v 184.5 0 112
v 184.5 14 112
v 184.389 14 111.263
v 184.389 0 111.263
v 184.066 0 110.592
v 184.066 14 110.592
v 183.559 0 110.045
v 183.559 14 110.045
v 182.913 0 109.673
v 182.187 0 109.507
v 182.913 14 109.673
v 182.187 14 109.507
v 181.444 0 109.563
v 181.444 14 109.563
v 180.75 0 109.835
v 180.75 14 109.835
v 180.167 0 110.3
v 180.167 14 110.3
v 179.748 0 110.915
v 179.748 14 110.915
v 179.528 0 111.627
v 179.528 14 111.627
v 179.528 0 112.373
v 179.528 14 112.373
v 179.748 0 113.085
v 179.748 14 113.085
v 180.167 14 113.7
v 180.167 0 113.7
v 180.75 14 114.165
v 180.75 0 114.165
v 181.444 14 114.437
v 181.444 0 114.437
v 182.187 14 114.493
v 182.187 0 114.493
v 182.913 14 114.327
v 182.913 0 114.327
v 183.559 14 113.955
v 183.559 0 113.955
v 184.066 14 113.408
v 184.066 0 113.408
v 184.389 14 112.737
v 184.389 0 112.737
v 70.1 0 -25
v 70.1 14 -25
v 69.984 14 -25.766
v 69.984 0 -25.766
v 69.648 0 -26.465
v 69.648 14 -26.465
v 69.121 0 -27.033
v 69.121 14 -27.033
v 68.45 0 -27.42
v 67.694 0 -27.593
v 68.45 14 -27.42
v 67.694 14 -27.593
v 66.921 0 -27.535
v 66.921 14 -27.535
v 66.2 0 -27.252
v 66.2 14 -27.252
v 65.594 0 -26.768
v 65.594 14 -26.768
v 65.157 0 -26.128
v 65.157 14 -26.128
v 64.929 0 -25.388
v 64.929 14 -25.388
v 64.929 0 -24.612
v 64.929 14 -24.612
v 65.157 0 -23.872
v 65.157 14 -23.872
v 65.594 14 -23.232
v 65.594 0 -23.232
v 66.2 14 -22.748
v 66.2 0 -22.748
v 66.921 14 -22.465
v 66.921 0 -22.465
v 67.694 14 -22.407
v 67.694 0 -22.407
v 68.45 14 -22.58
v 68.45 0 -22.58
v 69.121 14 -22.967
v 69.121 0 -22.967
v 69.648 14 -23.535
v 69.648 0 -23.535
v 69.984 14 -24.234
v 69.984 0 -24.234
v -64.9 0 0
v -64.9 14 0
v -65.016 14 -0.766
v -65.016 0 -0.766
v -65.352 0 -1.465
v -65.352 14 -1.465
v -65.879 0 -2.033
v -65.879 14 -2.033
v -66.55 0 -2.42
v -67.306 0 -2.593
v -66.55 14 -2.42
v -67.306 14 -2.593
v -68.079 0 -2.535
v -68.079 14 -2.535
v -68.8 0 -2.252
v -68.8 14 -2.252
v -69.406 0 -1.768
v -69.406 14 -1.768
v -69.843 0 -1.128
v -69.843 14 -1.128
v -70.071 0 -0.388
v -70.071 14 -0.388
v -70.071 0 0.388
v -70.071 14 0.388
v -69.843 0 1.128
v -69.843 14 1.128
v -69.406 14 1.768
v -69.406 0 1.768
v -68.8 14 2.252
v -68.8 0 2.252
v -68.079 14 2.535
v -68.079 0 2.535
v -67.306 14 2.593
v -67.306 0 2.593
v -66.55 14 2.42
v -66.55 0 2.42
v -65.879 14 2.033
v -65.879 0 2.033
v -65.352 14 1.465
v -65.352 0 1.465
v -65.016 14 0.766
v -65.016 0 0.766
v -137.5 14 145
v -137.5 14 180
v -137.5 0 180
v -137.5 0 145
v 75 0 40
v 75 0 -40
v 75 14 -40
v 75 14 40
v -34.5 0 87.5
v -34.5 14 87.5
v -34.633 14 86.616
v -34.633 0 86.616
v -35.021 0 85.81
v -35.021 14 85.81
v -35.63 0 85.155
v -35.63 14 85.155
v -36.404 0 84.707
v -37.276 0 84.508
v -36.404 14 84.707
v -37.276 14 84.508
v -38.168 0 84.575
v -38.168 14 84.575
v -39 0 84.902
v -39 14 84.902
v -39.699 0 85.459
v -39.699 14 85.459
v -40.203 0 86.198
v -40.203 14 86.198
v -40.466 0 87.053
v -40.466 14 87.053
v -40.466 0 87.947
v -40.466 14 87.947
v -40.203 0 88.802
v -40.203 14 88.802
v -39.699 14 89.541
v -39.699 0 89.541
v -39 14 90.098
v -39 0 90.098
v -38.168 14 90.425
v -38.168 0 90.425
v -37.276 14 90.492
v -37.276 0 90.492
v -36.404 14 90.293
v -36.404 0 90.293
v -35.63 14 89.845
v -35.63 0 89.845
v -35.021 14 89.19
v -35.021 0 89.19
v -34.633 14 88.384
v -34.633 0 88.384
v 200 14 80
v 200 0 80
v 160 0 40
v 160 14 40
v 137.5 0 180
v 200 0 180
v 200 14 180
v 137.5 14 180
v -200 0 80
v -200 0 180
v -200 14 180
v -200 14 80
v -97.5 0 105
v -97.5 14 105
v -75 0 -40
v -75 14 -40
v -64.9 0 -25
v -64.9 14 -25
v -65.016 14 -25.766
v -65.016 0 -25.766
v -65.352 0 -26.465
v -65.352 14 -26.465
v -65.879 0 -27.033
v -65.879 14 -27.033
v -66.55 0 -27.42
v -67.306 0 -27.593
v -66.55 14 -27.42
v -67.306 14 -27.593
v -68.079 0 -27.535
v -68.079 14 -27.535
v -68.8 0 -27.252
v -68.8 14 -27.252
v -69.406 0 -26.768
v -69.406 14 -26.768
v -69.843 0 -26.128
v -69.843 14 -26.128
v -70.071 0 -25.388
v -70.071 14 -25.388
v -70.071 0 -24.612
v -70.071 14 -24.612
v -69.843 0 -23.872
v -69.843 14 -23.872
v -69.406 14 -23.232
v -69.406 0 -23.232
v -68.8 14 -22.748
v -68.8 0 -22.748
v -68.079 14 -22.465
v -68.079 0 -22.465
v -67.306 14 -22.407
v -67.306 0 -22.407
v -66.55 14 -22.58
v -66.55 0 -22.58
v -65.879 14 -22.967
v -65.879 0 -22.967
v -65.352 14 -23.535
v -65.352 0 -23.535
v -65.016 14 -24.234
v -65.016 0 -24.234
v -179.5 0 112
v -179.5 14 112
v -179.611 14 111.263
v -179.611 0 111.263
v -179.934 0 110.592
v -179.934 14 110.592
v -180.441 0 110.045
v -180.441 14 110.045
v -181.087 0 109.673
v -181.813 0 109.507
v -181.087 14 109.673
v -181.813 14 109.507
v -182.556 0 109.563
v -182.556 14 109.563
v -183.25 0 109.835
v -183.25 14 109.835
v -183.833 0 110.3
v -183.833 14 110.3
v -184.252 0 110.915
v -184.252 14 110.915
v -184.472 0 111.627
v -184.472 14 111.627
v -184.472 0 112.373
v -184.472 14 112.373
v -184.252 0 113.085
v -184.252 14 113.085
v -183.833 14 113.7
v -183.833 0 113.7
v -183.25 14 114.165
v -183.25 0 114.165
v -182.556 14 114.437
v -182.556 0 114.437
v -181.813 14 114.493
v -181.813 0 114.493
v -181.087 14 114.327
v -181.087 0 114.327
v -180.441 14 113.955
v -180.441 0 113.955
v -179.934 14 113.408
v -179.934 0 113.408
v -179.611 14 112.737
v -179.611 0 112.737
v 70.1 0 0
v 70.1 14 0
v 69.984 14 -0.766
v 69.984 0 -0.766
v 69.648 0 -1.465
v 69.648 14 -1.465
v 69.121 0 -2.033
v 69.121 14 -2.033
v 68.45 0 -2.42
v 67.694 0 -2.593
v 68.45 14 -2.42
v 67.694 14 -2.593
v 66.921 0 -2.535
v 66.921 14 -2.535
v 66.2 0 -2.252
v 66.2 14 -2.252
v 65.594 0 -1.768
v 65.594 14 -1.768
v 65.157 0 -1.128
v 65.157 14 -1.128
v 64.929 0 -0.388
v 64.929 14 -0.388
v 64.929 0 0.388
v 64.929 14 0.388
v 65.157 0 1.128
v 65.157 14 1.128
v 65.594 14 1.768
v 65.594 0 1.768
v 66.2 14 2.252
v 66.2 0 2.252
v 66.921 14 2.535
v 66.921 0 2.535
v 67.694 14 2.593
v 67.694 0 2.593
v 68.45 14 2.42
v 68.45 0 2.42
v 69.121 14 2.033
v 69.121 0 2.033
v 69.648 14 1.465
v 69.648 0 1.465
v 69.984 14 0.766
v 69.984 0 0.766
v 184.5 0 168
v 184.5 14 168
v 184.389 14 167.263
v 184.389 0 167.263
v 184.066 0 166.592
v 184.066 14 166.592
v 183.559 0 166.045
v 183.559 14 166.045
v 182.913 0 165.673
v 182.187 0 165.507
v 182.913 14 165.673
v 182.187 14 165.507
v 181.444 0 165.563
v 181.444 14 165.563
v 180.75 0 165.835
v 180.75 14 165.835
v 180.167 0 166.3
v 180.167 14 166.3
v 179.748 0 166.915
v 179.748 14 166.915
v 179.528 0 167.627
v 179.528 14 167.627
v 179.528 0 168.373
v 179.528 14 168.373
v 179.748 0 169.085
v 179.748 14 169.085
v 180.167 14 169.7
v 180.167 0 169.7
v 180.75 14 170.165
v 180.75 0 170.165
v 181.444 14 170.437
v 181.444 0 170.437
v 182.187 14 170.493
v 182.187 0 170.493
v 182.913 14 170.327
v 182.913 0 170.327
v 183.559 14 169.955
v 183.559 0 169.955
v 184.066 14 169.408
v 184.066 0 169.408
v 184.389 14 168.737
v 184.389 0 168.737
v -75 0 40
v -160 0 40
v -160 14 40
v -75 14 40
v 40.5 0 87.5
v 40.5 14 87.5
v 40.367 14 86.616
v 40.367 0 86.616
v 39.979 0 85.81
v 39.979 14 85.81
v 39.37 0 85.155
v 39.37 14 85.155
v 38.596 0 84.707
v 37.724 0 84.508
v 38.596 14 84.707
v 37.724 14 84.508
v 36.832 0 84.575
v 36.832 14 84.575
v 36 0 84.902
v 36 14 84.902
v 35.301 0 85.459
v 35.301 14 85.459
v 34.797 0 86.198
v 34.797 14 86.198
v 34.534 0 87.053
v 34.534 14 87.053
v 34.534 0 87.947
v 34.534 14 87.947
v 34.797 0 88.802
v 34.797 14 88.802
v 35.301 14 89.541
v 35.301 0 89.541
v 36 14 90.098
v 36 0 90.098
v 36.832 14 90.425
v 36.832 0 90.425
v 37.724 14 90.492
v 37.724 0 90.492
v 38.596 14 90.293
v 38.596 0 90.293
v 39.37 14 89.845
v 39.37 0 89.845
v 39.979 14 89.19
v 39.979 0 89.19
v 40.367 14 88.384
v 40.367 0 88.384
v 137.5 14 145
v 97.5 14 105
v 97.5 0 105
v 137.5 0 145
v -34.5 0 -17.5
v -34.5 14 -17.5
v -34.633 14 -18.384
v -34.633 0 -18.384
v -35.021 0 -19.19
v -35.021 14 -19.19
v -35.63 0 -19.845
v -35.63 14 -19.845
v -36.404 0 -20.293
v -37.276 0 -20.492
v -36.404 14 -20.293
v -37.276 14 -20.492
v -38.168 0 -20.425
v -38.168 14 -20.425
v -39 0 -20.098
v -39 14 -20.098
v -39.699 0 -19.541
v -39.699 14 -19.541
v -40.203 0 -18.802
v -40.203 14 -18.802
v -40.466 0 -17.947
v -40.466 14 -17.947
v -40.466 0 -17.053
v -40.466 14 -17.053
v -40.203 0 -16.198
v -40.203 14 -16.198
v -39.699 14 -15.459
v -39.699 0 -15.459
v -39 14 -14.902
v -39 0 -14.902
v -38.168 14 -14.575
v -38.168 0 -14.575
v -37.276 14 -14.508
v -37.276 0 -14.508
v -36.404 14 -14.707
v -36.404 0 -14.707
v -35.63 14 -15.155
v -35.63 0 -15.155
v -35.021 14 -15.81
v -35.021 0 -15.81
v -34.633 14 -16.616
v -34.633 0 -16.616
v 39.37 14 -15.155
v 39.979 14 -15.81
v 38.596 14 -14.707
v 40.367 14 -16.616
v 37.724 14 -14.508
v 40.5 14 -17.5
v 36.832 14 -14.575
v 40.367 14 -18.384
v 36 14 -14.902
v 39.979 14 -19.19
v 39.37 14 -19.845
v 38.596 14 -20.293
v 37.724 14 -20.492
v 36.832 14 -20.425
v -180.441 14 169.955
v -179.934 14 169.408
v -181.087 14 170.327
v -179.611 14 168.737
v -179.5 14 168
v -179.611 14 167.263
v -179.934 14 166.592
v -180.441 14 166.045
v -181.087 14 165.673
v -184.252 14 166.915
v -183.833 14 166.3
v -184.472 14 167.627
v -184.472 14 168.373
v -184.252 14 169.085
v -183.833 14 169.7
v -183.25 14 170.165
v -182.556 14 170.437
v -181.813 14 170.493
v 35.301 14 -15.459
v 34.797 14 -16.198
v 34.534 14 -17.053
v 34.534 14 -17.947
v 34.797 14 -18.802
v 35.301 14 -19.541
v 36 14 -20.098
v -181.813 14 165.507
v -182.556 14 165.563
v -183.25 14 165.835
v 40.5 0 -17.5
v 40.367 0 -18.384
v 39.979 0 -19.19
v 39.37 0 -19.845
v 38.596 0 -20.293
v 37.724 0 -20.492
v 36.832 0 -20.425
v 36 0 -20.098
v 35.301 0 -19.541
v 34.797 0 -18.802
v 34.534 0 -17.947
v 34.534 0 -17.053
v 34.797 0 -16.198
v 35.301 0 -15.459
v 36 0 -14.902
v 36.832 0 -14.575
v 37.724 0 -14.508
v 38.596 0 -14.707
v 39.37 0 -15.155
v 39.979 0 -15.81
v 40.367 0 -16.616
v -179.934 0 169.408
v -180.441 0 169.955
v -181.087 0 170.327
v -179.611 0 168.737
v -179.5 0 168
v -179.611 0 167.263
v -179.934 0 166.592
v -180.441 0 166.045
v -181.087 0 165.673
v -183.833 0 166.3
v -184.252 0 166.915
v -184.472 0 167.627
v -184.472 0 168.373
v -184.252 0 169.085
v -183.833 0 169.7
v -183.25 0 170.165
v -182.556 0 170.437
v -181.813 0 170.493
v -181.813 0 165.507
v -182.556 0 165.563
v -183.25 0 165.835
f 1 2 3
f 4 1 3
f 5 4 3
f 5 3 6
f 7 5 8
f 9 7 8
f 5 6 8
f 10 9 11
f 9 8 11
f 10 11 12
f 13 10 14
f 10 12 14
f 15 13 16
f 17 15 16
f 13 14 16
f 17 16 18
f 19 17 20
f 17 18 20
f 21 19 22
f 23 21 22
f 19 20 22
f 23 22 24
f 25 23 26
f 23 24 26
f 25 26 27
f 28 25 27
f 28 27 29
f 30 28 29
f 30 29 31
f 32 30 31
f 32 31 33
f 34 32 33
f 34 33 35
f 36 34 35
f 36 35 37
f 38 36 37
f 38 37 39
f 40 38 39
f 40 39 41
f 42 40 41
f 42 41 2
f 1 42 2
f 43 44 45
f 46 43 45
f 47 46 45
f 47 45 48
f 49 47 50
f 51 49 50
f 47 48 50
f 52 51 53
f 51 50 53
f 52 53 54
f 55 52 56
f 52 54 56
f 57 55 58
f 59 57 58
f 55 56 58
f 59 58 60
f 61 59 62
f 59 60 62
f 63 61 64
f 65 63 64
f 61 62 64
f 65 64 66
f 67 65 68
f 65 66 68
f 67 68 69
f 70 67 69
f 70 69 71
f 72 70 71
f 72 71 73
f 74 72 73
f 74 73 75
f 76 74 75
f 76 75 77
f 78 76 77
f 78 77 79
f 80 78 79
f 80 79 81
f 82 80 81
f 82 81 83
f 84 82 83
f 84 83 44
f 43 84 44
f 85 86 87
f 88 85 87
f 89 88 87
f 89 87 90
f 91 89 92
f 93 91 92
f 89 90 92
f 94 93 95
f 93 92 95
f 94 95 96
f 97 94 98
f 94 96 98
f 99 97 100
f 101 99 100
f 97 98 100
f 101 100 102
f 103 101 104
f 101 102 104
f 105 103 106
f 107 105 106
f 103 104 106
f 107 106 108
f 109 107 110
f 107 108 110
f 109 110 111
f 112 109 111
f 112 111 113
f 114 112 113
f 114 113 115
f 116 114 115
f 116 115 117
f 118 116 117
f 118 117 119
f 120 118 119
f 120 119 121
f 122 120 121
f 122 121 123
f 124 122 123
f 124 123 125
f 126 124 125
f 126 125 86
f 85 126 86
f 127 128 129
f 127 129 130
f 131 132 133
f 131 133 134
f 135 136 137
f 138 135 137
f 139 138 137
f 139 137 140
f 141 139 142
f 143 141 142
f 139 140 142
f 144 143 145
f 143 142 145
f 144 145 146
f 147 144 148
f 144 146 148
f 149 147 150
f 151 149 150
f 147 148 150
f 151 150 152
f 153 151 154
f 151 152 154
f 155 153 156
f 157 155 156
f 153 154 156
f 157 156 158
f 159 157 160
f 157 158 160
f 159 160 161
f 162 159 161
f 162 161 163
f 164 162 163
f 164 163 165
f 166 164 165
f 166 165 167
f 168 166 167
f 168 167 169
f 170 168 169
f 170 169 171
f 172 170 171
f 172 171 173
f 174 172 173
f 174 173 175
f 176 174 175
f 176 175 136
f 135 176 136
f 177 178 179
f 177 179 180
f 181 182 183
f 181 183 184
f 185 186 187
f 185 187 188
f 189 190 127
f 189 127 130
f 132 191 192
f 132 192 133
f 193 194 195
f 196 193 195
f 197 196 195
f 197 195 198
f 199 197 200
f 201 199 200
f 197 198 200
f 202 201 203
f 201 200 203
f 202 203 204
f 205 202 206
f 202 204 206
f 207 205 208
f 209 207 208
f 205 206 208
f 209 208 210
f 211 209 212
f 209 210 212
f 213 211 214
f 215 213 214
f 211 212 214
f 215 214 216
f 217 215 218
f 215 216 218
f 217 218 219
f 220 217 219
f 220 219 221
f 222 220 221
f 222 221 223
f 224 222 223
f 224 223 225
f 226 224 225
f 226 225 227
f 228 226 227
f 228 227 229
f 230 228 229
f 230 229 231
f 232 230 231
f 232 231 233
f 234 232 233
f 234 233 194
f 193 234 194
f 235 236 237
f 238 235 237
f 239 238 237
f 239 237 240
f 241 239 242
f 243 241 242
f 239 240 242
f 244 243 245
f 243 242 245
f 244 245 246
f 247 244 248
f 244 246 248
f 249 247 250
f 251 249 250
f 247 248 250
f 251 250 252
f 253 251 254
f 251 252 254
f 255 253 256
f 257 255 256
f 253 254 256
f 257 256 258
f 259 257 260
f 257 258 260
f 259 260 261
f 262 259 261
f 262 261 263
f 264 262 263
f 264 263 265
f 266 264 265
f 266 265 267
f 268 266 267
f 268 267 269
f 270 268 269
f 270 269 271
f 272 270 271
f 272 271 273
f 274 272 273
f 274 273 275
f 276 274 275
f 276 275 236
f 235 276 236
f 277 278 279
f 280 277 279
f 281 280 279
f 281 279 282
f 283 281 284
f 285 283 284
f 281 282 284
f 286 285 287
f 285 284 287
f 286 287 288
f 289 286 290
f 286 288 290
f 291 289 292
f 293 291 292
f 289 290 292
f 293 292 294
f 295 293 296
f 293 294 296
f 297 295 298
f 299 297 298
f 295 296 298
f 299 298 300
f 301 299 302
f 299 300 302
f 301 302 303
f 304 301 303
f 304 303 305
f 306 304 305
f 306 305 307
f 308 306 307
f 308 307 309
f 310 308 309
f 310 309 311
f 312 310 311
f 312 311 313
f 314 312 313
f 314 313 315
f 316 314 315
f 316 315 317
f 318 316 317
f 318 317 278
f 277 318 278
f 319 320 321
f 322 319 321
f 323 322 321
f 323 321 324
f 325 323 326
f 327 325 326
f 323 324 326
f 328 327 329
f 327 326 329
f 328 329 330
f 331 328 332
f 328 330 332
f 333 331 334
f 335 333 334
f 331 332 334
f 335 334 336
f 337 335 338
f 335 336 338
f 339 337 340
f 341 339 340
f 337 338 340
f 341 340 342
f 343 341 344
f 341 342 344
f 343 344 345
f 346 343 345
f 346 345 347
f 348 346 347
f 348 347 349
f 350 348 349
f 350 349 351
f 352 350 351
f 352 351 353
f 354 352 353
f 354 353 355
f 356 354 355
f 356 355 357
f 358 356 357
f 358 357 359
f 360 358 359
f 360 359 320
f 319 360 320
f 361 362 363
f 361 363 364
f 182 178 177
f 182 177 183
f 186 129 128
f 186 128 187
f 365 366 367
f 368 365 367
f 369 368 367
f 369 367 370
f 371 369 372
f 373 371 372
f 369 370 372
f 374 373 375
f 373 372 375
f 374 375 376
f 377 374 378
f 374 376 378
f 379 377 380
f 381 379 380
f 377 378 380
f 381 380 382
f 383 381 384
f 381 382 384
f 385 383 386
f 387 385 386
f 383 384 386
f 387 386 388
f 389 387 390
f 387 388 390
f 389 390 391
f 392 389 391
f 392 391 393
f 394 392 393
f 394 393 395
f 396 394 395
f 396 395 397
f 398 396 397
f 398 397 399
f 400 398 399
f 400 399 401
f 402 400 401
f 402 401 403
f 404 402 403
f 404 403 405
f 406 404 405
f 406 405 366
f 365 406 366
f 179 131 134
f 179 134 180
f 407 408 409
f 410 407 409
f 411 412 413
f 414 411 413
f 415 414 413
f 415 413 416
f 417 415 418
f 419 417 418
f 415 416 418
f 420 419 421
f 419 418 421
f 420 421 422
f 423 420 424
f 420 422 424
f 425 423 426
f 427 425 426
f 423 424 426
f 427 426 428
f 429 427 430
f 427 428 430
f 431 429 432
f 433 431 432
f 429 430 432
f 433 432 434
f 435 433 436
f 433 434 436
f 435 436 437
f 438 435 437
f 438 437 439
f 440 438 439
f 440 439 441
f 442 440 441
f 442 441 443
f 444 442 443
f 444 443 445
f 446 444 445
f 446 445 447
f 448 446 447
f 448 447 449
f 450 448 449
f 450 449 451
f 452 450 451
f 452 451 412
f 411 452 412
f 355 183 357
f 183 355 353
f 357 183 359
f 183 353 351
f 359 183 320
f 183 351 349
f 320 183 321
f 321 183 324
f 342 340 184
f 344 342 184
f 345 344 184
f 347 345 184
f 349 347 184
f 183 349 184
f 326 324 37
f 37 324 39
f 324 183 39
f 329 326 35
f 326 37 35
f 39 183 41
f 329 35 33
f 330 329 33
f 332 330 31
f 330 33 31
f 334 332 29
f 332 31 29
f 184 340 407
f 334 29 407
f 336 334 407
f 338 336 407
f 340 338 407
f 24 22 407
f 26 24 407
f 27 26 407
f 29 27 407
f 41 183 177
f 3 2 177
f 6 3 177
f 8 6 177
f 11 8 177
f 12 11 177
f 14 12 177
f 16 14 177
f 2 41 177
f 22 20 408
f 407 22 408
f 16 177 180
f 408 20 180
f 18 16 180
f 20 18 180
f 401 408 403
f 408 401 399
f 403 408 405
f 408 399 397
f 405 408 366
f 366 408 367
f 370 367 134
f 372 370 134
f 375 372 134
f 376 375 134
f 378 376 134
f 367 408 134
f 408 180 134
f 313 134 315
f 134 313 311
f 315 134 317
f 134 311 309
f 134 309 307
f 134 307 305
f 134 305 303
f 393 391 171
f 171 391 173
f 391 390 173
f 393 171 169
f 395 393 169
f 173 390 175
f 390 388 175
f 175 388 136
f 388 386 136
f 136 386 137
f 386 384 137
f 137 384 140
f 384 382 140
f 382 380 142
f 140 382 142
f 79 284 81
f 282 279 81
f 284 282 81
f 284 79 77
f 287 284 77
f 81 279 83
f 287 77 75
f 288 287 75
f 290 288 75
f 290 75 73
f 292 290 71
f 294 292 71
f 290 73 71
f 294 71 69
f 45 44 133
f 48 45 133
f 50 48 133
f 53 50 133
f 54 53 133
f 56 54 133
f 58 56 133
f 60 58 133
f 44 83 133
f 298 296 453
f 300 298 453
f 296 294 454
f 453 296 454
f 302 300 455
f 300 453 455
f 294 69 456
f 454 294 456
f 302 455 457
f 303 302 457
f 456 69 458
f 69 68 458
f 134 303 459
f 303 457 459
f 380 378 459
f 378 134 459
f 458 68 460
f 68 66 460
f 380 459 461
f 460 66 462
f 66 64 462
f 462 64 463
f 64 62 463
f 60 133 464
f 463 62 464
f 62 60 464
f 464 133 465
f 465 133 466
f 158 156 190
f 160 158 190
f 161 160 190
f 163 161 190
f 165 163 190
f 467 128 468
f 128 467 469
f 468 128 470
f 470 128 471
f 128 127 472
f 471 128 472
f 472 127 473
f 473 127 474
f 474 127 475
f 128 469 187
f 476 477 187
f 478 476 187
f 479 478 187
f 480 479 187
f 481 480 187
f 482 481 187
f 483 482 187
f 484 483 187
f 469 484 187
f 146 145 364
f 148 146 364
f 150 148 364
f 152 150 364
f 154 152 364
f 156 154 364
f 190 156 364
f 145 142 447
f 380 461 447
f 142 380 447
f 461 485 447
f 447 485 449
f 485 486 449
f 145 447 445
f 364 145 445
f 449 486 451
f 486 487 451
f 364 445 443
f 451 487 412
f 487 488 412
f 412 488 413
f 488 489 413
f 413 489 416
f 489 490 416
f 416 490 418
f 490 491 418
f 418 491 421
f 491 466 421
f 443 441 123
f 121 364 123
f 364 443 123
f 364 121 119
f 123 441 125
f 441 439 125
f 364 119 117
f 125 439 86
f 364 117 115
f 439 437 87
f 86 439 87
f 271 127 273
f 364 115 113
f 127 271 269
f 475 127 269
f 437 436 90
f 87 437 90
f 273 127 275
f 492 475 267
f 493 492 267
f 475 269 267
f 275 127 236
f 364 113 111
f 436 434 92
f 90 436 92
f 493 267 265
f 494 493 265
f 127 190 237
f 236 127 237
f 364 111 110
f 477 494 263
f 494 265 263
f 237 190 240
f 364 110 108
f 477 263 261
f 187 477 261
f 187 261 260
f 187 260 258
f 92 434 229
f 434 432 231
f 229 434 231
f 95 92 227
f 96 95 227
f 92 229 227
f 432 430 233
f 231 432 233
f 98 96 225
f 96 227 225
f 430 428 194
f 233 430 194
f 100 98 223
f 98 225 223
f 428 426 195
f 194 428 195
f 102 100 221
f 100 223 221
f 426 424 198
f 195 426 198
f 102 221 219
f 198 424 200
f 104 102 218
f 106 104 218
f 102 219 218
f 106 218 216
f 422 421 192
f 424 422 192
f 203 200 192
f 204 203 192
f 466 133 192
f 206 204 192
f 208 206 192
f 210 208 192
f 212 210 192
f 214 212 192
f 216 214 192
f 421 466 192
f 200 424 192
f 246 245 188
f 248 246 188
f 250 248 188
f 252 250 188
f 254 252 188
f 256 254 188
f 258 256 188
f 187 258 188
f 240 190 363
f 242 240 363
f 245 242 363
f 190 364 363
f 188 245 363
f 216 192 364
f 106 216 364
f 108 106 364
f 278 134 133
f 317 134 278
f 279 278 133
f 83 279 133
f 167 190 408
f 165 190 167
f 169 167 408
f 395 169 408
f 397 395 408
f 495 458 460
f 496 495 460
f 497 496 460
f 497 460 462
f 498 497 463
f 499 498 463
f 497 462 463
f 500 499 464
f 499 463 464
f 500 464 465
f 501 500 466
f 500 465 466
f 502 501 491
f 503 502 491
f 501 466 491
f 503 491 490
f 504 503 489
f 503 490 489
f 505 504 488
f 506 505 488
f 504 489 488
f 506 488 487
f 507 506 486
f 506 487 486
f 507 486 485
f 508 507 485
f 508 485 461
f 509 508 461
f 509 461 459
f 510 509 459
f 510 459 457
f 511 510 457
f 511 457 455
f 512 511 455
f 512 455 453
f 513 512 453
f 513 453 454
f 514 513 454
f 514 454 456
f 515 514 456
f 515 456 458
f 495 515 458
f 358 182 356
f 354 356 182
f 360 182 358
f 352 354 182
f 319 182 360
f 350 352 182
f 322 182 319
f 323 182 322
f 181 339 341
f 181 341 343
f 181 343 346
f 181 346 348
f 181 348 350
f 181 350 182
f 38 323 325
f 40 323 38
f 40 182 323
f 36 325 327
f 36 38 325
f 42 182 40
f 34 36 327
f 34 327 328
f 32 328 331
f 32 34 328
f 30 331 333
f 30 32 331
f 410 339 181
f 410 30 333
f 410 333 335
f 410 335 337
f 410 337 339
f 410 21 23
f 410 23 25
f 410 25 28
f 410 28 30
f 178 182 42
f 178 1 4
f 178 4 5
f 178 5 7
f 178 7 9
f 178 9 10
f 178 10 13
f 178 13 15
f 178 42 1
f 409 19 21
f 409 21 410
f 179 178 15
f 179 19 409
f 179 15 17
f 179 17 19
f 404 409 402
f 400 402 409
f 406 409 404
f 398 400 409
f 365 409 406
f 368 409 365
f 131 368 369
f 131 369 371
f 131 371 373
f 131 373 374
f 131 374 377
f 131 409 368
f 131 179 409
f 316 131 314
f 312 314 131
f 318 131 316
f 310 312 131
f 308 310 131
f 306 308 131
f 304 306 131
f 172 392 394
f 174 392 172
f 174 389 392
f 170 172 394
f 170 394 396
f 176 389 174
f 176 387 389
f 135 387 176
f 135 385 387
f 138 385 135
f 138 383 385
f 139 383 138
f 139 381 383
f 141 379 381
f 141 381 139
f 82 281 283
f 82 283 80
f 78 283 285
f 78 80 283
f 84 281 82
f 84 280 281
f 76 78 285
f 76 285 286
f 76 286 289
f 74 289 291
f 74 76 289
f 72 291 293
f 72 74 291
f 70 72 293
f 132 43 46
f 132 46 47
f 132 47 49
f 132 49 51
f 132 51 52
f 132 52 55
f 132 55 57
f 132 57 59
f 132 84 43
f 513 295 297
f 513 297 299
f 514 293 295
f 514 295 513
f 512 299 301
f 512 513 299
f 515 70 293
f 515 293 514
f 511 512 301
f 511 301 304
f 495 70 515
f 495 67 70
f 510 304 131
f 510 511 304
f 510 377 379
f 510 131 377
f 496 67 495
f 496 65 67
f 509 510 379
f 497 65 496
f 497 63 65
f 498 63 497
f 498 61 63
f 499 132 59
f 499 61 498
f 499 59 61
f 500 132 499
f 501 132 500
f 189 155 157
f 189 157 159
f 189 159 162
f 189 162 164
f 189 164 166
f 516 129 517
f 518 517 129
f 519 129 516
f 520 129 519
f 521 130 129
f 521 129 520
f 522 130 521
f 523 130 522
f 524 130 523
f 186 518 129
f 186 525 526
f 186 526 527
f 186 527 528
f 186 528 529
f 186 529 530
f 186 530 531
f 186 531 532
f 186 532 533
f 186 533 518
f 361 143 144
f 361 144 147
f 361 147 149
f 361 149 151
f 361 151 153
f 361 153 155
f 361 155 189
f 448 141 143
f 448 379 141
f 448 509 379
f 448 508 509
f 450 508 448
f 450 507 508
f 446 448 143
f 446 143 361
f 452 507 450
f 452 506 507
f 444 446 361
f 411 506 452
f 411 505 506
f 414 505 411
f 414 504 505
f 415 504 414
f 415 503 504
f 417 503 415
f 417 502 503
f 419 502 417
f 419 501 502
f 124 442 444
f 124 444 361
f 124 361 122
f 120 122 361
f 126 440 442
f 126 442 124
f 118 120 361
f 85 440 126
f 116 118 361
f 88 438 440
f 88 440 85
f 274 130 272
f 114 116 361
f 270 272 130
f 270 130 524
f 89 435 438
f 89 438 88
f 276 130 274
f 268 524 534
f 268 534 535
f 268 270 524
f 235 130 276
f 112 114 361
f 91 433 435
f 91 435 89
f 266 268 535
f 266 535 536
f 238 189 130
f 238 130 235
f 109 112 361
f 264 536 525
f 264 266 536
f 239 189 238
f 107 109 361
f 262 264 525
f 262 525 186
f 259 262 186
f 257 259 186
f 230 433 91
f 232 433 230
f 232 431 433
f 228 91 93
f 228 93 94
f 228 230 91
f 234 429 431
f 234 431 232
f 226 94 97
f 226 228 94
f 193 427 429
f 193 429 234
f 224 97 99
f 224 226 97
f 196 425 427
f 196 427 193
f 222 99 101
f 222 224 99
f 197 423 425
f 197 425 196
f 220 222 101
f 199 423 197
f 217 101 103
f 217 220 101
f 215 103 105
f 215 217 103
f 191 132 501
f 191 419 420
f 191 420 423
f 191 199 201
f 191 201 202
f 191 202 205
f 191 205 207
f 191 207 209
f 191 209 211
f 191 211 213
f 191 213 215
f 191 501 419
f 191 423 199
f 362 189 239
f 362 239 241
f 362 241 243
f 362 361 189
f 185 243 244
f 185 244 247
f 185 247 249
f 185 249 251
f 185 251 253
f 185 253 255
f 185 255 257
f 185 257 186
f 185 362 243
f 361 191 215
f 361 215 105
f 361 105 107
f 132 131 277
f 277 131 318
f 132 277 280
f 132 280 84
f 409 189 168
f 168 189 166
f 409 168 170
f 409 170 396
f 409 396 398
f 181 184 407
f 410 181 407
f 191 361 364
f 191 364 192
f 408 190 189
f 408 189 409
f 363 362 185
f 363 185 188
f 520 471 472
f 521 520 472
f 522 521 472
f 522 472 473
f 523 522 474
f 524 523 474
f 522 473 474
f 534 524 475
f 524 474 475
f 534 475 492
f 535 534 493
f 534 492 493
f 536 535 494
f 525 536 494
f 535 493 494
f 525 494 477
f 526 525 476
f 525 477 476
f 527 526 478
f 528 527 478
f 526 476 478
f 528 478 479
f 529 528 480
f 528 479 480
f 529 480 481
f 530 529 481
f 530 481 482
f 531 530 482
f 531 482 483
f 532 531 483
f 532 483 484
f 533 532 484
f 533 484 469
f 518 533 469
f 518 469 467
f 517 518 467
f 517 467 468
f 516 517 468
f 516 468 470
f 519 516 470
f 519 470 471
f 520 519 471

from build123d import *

# Parameters (mm, degrees)
BOSS_EXTRUDE1_DEPTH     = 14
SKETCH2_R               = 2.6
SKETCH2_R_2             = 2.5
SKETCH2_R_3             = 3
SKETCH2_W               = 275
SKETCH2_H               = 75
CUT_EXTRUDE1_DEPTH      = 1
CUT_EXTRUDE1_DEPTH_BACK = 15
CHAMFER1_SIZE           = 40


with BuildPart() as part:
    # Sketch1 → Boss-Extrude1 (new body)
    with BuildSketch(Plane(origin=(0, 0, 0), x_dir=(1, 0, 0), z_dir=(0, 1, 0))):
        Polygon((-75, -40), (-75, 40), (75, 40), (75, -40), (200, -40), (200, -180), (-200, -180), (-200, -40), align=None)
    extrude(amount=BOSS_EXTRUDE1_DEPTH)

    # Sketch2 → Cut-Extrude1 (cut, two sides)
    with BuildSketch(Plane(origin=(0, 14, 0), x_dir=(1, 0, 0), z_dir=(0, 1, 0))) as cut_extrude1_sk:
        with Locations((-67.5, 25)):
            Circle(SKETCH2_R)
        with Locations((-67.5, 0)):
            Circle(SKETCH2_R)
        with Locations((-182, -168)):
            Circle(SKETCH2_R_2)
        with Locations((-182, -112)):
            Circle(SKETCH2_R_2)
        with Locations((-37.5, 17.5)):
            Circle(SKETCH2_R_3)
        with Locations((-37.5, -87.5)):
            Circle(SKETCH2_R_3)
        with Locations((37.5, -87.5)):
            Circle(SKETCH2_R_3)
        with Locations((37.5, 17.5)):
            Circle(SKETCH2_R_3)
        with Locations((182, -112)):
            Circle(SKETCH2_R_2)
        with Locations((182, -168)):
            Circle(SKETCH2_R_2)
        with Locations((67.5, 0)):
            Circle(SKETCH2_R)
        with Locations((67.5, 25)):
            Circle(SKETCH2_R)
        with Locations((0, -142.5)):
            Rectangle(SKETCH2_W, SKETCH2_H)
    extrude(amount=CUT_EXTRUDE1_DEPTH, mode=Mode.SUBTRACT)
    extrude(cut_extrude1_sk.sketch, amount=-CUT_EXTRUDE1_DEPTH_BACK, mode=Mode.SUBTRACT)

    # Chamfer1
    chamfer1_edges = [part.edges().sort_by_distance(p)[0] for p in [
        (200, 7, 40),
        (-200, 7, 40),
        (-137.5, 7, 105),
        (137.5, 7, 105),
    ]]
    chamfer(chamfer1_edges, length=CHAMFER1_SIZE)


solid = part.part
